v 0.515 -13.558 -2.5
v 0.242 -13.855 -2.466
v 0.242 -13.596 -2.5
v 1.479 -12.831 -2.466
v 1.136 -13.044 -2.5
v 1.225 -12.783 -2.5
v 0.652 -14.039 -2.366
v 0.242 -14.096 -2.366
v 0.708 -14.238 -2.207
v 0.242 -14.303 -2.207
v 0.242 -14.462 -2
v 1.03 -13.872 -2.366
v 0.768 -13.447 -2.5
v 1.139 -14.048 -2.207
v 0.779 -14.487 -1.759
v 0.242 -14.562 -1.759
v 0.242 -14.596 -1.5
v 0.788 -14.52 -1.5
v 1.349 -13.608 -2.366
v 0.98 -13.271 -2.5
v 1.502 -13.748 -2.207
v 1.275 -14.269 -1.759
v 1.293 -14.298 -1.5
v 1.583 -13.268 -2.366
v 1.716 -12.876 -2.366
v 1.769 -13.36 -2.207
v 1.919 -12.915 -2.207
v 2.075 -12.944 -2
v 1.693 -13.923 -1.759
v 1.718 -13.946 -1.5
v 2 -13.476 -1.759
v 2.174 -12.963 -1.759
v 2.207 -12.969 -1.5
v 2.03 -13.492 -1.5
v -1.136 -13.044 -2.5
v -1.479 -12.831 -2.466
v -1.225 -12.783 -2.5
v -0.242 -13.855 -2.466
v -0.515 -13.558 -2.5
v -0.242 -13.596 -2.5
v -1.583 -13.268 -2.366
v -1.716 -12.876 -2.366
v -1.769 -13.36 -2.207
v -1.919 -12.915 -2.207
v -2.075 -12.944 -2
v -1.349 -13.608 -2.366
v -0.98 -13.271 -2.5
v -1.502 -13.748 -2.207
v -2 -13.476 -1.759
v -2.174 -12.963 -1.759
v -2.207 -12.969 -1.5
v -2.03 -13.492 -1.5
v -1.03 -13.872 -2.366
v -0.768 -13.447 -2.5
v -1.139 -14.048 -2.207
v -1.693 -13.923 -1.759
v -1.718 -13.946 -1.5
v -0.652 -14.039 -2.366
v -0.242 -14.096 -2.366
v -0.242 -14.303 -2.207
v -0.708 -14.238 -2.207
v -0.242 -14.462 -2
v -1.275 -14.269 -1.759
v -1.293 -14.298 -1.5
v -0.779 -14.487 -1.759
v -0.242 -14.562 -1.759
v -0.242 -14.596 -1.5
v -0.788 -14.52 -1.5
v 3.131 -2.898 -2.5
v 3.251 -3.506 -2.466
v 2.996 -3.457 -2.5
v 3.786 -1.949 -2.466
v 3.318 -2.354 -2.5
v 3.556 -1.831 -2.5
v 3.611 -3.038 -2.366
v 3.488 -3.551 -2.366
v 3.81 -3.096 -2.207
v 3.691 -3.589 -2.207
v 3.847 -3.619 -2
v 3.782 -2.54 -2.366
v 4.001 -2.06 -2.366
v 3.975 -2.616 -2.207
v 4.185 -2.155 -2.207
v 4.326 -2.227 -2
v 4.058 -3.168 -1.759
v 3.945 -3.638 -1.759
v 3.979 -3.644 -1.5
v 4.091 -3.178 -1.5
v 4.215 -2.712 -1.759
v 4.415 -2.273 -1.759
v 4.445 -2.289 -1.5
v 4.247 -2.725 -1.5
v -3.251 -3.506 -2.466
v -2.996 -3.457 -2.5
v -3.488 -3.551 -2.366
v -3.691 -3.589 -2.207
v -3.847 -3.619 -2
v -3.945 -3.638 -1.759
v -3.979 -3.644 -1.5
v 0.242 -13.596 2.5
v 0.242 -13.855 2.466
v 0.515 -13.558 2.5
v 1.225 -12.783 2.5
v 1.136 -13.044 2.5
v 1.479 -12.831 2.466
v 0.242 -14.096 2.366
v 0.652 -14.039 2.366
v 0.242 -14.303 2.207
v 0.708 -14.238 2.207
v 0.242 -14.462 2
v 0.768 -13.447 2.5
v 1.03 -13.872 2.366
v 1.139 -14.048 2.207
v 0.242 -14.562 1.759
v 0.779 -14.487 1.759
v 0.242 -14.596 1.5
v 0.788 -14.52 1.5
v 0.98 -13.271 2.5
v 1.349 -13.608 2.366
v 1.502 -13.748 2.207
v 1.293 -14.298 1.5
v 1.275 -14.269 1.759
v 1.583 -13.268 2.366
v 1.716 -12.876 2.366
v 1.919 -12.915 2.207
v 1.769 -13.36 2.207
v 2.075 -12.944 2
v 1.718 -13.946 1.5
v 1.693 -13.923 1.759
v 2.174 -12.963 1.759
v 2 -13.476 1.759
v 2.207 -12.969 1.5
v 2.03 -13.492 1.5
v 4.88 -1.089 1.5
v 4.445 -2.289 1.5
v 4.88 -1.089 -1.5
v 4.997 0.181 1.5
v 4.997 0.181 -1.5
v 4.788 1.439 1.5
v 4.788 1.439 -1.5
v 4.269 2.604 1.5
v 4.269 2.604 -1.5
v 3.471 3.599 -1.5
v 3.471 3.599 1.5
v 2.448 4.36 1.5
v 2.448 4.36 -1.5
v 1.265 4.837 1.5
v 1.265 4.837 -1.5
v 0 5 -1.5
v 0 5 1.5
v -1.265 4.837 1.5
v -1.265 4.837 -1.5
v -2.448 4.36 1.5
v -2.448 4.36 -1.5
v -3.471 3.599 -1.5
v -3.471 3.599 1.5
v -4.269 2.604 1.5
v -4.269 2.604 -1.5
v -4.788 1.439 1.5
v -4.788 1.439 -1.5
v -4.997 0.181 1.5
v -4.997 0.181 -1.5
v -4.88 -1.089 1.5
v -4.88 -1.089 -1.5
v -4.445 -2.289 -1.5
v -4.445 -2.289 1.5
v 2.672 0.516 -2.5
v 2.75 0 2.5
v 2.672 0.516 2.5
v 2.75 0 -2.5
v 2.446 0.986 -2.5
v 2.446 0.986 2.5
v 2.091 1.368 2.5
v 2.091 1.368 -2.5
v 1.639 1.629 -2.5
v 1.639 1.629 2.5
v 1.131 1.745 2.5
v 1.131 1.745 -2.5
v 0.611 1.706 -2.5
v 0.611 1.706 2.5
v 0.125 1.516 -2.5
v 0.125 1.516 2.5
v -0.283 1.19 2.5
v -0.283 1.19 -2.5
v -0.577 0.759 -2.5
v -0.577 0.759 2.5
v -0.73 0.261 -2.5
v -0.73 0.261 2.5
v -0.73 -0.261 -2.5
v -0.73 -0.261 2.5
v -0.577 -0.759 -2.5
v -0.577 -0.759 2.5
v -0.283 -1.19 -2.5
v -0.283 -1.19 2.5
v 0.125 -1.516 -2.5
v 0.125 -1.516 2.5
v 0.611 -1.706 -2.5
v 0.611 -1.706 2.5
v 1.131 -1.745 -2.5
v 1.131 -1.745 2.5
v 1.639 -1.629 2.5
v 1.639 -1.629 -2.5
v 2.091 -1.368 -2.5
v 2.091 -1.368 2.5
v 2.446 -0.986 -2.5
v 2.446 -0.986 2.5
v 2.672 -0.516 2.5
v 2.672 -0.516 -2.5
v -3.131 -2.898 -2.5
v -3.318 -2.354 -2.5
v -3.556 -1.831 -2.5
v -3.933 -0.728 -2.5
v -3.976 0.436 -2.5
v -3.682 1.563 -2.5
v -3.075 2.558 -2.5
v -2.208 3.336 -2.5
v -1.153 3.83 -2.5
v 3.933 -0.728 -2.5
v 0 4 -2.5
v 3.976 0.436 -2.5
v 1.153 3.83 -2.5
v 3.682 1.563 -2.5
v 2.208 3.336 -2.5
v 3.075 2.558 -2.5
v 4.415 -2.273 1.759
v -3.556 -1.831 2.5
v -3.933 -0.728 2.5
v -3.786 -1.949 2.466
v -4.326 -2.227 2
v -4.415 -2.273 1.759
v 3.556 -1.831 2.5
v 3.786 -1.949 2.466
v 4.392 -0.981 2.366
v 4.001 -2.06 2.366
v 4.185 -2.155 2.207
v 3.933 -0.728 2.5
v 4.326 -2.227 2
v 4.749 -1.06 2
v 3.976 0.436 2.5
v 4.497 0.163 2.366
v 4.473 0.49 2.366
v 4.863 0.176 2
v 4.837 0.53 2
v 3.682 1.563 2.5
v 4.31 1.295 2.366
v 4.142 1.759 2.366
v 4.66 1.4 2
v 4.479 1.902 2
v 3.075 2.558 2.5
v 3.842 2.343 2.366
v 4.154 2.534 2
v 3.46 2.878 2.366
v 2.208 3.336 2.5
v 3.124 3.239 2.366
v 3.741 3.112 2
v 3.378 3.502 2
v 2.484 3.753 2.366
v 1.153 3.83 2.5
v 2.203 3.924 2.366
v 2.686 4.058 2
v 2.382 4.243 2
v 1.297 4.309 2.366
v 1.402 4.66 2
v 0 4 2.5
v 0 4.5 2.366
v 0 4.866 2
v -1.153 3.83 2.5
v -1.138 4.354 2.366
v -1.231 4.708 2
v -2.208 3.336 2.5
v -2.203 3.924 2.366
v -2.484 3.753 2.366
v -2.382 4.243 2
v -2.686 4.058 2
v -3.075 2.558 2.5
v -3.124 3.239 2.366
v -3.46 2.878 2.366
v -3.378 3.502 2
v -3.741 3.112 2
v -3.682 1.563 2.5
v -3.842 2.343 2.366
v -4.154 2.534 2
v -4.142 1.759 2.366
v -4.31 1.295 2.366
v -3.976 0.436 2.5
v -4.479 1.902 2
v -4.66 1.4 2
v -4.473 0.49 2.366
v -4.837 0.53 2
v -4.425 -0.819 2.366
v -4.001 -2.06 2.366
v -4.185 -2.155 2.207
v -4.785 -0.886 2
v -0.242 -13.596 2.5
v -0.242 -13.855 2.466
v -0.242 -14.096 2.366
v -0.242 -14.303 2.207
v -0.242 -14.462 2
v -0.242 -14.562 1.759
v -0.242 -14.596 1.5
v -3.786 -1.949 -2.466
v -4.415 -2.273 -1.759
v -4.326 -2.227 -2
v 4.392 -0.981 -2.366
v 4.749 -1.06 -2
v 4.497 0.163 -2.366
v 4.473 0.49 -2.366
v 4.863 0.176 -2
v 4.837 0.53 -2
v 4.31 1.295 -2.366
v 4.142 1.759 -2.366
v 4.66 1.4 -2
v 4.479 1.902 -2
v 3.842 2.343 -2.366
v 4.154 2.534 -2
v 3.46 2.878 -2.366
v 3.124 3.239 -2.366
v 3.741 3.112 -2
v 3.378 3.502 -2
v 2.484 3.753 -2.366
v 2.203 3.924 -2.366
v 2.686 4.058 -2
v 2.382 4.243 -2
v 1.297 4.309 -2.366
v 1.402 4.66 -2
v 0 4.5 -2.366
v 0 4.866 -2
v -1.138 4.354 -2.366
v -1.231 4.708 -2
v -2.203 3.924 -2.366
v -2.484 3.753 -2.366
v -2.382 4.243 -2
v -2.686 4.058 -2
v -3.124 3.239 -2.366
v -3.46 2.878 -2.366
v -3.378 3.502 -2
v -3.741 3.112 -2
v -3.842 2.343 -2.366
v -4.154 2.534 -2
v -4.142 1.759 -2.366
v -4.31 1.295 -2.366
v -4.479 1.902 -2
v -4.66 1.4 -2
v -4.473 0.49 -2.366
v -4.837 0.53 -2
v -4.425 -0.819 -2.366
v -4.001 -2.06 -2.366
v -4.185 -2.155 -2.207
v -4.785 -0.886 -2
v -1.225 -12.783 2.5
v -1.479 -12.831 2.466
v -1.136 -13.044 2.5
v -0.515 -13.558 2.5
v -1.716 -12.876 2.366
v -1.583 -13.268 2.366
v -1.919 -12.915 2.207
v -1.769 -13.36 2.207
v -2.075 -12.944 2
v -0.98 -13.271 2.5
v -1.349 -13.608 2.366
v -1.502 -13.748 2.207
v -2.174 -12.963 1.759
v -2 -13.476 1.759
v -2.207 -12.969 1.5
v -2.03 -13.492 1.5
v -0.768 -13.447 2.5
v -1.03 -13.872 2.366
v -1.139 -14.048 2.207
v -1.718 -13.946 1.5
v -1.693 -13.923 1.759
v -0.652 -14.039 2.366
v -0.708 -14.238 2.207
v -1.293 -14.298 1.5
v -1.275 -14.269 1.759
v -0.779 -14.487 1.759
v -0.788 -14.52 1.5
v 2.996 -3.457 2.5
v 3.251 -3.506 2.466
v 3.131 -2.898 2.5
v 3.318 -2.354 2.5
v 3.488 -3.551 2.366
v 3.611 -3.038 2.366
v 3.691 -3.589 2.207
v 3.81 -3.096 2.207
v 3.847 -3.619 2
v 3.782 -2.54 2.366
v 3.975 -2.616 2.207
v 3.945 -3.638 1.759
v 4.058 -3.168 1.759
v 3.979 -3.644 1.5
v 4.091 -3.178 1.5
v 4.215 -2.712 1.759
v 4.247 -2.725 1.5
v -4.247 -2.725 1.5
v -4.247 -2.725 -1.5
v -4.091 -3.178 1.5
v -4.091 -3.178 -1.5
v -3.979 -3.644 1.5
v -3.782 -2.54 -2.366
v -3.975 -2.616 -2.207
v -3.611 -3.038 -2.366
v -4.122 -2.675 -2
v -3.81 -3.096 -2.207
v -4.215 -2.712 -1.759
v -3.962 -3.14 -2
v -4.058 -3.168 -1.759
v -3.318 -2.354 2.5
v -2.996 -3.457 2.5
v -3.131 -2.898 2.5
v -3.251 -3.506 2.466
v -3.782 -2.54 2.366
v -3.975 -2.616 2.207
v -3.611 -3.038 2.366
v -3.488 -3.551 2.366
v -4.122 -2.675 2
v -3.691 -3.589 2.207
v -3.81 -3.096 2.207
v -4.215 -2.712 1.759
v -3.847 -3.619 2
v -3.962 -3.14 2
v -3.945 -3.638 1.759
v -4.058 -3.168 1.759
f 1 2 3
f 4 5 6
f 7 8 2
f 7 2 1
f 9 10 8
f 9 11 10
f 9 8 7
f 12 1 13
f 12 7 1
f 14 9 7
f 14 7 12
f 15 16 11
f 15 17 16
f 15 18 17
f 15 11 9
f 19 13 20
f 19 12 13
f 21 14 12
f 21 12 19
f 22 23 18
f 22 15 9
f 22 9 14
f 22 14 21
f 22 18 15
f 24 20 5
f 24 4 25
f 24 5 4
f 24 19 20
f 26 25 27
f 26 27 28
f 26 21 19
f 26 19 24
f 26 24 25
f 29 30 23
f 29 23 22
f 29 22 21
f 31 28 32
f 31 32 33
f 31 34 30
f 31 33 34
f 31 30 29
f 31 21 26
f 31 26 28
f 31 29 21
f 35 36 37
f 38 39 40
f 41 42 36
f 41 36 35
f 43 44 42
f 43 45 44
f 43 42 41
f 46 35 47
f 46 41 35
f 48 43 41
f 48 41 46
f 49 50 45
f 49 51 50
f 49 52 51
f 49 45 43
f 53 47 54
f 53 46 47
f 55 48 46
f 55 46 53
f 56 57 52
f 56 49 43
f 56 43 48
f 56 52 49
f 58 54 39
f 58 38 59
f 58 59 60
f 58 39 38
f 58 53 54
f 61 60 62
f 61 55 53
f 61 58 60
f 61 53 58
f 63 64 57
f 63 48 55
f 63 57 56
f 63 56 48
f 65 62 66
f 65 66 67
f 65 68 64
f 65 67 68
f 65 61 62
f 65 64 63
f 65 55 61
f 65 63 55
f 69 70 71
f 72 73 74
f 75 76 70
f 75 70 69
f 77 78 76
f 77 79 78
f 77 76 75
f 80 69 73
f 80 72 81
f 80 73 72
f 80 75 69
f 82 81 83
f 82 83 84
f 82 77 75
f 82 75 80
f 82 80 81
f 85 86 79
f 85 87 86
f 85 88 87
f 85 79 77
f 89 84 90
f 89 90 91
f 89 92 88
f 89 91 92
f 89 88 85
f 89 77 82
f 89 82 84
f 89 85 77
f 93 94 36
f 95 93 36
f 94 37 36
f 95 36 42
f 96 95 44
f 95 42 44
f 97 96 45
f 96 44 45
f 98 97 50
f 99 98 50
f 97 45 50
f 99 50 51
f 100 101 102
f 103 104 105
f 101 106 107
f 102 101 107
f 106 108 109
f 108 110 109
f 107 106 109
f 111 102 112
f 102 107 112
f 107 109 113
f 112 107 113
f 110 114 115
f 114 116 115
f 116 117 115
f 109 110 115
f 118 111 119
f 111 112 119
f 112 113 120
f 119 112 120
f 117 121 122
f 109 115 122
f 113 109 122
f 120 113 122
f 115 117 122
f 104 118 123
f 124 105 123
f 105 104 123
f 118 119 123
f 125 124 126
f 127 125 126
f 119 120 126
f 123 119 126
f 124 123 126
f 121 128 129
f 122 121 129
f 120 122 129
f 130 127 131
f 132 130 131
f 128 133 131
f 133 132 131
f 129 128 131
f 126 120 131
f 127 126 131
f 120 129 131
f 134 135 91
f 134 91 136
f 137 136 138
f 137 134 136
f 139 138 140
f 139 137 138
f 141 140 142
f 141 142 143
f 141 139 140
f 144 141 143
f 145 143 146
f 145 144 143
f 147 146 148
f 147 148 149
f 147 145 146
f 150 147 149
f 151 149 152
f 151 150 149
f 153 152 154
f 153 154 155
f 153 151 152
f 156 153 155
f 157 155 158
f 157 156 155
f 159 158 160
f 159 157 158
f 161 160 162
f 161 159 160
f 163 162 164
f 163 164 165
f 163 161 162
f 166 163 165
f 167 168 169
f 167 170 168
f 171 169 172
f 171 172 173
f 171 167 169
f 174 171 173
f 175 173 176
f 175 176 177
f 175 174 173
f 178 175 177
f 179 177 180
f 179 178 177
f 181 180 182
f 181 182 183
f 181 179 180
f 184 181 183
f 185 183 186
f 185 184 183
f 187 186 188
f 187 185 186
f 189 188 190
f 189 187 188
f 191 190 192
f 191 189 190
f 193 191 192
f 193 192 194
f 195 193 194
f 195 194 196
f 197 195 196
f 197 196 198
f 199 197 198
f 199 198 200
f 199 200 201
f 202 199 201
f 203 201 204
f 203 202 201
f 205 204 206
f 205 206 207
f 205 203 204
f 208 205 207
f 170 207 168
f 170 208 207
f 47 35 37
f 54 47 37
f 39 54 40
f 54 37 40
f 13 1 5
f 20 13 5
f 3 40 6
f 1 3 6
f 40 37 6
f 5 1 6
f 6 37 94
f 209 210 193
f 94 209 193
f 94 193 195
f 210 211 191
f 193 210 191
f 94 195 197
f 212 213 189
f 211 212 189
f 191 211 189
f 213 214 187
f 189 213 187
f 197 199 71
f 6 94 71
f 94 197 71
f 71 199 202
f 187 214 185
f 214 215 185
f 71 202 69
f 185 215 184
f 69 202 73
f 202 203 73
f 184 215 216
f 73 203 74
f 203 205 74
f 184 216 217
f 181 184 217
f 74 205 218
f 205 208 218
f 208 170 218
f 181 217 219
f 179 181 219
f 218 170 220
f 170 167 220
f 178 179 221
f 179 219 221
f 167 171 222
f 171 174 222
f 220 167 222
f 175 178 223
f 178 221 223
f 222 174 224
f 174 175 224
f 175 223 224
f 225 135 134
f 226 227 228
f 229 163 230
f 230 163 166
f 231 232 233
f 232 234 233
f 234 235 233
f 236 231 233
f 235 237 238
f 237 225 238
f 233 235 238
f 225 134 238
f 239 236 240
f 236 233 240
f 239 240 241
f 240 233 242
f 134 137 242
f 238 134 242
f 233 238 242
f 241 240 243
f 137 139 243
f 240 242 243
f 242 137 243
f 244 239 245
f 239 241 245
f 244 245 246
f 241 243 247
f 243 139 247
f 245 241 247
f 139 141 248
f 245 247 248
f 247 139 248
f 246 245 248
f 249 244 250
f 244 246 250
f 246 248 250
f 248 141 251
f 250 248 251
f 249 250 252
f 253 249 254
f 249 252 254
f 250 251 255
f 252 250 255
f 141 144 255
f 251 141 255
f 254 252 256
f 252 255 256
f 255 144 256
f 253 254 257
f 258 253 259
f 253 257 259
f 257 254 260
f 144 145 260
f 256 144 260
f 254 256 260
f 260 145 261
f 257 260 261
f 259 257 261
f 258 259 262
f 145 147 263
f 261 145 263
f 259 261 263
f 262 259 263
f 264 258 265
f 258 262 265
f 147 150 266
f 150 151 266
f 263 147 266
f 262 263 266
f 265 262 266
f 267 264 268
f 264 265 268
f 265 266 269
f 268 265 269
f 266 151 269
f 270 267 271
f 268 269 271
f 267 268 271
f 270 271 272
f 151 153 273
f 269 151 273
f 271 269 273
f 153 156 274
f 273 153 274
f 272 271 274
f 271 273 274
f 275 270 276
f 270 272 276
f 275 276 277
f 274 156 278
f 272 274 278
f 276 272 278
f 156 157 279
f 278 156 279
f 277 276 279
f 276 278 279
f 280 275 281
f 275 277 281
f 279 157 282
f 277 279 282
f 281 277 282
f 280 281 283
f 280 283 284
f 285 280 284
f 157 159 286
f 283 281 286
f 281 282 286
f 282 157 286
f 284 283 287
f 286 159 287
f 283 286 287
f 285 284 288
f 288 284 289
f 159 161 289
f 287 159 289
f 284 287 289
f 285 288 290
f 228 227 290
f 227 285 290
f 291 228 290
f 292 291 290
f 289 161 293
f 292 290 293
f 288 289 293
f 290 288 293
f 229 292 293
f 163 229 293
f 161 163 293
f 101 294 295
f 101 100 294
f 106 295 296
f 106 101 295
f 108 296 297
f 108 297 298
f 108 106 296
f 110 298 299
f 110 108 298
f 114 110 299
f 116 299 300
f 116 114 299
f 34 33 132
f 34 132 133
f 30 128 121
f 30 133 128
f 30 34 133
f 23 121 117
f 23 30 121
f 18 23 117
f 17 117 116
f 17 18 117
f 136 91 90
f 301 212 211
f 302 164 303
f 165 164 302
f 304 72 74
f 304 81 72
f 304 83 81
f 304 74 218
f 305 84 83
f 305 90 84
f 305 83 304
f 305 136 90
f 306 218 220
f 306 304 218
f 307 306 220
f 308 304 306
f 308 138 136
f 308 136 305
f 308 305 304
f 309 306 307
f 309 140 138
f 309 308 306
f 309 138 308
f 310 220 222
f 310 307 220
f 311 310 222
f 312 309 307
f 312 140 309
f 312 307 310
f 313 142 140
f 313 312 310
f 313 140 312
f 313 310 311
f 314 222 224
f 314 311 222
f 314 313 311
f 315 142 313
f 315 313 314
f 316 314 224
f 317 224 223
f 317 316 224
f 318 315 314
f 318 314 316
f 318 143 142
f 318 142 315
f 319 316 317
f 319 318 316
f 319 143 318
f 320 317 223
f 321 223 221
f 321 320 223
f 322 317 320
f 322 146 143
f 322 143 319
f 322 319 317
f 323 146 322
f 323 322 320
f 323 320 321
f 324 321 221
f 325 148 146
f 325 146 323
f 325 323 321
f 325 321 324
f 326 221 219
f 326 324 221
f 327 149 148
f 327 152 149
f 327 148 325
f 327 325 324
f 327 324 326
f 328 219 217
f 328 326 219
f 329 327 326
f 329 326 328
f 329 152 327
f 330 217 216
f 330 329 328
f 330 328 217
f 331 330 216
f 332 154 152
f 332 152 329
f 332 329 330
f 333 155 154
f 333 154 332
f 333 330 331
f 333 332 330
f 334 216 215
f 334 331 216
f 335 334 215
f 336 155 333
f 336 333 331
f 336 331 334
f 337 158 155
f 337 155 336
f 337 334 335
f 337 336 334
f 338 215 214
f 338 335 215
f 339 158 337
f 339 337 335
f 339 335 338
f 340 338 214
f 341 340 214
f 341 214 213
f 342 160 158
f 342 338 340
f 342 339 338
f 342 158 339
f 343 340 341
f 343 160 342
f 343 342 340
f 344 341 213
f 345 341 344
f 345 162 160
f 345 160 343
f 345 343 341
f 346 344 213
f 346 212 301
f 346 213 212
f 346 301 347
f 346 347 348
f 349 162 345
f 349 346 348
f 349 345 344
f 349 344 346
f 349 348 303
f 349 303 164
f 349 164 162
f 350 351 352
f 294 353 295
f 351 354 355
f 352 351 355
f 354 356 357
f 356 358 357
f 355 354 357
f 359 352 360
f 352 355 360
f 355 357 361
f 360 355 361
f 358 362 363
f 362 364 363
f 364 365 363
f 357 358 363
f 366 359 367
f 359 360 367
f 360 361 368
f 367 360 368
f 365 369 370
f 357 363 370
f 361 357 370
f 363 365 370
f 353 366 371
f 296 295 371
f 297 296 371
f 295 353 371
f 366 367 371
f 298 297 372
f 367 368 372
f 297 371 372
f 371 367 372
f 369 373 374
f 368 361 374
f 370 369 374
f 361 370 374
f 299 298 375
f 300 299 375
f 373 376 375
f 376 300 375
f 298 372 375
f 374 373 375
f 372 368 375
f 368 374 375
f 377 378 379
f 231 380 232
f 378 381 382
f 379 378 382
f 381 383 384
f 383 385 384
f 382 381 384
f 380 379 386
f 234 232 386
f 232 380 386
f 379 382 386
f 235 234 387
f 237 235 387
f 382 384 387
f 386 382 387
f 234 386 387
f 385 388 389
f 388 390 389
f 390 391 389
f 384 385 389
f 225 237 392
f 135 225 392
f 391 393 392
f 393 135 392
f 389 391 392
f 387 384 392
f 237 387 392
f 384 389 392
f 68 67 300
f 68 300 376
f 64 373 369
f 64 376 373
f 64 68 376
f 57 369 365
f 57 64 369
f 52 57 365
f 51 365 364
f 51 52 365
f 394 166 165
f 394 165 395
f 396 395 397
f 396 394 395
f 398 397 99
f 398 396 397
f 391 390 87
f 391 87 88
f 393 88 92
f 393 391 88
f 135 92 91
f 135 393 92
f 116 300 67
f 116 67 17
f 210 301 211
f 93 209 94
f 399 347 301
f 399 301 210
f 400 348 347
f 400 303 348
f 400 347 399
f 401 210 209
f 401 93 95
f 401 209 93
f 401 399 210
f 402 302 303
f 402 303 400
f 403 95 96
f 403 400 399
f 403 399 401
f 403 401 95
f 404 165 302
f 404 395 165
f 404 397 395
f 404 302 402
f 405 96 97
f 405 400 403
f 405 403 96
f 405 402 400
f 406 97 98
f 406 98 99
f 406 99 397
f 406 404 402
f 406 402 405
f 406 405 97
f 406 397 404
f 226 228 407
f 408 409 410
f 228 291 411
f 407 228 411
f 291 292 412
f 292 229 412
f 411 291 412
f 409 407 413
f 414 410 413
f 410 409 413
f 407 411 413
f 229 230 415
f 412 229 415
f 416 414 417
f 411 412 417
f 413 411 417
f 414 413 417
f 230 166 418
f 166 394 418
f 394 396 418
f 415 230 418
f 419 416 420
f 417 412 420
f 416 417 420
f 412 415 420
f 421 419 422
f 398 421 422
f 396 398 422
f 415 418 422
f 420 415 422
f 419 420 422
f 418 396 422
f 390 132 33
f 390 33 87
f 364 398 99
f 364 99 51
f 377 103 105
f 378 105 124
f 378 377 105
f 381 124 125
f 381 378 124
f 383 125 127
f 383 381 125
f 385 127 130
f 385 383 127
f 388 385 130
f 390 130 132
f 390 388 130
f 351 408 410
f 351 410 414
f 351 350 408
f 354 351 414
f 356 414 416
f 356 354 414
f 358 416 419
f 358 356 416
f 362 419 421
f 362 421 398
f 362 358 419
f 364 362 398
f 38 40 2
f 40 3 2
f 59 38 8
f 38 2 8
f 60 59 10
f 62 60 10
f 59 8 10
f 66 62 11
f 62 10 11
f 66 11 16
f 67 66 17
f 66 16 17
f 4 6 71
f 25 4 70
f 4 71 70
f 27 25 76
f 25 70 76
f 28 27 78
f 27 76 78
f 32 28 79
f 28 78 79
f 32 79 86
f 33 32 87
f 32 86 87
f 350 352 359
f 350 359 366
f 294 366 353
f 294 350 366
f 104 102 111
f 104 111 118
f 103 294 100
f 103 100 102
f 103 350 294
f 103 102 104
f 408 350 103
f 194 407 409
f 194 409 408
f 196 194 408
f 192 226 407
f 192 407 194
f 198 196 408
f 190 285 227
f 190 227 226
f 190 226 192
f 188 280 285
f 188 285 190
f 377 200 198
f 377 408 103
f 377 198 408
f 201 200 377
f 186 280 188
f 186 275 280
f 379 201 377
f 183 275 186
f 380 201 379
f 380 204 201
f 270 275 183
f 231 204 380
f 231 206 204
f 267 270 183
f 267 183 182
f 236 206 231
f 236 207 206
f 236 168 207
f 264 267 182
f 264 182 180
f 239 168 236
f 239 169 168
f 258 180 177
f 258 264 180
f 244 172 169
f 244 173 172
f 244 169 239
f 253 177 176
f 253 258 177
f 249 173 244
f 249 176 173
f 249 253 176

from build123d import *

# Parameters (mm, degrees)
F0_R     = 1.75
F1_DEPTH = 2.5
F2_R     = 2
F3_R     = 5
F4_R     = 1


with BuildPart() as f1:
    # F0 (on Top) → F1 (new body, symmetric)
    with BuildSketch(Plane.XY):
        with BuildLine():
            Line((1.8980583428, -14.5959100367), (4.1378631671, -2.8067932611))
            ThreePointArc((4.1378631671, -2.8067932611), (0, 5), (-4.1378631671, -2.8067932611))
            Line((-4.1378631671, -2.8067932611), (-1.8980583428, -14.5959100367))
            Line((-1.8980583428, -14.5959100367), (1.8980583428, -14.5959100367))
        make_face()
        with Locations((1, 0)):
            Circle(F0_R, mode=Mode.SUBTRACT)
    extrude(amount=F1_DEPTH, both=True)

    # F2
    f2_edges = [f1.edges().sort_by_distance(p)[0] for p in [
        (1.898058, -14.59591, 0),
        (-1.898058, -14.59591, 0),
    ]]
    fillet(f2_edges, radius=F2_R)

    # F3
    f3_edges = [f1.edges().sort_by_distance(p)[0] for p in [
        (4.137863, -2.806793, 0),
        (-4.137863, -2.806793, 0),
    ]]
    fillet(f3_edges, radius=F3_R)

    # F4
    f4_edges = [f1.edges().sort_by_distance(p)[0] for p in [
        (0, 5, 2.5),
        (0, 5, -2.5),
    ]]
    fillet(f4_edges, radius=F4_R)


solid = f1.part
